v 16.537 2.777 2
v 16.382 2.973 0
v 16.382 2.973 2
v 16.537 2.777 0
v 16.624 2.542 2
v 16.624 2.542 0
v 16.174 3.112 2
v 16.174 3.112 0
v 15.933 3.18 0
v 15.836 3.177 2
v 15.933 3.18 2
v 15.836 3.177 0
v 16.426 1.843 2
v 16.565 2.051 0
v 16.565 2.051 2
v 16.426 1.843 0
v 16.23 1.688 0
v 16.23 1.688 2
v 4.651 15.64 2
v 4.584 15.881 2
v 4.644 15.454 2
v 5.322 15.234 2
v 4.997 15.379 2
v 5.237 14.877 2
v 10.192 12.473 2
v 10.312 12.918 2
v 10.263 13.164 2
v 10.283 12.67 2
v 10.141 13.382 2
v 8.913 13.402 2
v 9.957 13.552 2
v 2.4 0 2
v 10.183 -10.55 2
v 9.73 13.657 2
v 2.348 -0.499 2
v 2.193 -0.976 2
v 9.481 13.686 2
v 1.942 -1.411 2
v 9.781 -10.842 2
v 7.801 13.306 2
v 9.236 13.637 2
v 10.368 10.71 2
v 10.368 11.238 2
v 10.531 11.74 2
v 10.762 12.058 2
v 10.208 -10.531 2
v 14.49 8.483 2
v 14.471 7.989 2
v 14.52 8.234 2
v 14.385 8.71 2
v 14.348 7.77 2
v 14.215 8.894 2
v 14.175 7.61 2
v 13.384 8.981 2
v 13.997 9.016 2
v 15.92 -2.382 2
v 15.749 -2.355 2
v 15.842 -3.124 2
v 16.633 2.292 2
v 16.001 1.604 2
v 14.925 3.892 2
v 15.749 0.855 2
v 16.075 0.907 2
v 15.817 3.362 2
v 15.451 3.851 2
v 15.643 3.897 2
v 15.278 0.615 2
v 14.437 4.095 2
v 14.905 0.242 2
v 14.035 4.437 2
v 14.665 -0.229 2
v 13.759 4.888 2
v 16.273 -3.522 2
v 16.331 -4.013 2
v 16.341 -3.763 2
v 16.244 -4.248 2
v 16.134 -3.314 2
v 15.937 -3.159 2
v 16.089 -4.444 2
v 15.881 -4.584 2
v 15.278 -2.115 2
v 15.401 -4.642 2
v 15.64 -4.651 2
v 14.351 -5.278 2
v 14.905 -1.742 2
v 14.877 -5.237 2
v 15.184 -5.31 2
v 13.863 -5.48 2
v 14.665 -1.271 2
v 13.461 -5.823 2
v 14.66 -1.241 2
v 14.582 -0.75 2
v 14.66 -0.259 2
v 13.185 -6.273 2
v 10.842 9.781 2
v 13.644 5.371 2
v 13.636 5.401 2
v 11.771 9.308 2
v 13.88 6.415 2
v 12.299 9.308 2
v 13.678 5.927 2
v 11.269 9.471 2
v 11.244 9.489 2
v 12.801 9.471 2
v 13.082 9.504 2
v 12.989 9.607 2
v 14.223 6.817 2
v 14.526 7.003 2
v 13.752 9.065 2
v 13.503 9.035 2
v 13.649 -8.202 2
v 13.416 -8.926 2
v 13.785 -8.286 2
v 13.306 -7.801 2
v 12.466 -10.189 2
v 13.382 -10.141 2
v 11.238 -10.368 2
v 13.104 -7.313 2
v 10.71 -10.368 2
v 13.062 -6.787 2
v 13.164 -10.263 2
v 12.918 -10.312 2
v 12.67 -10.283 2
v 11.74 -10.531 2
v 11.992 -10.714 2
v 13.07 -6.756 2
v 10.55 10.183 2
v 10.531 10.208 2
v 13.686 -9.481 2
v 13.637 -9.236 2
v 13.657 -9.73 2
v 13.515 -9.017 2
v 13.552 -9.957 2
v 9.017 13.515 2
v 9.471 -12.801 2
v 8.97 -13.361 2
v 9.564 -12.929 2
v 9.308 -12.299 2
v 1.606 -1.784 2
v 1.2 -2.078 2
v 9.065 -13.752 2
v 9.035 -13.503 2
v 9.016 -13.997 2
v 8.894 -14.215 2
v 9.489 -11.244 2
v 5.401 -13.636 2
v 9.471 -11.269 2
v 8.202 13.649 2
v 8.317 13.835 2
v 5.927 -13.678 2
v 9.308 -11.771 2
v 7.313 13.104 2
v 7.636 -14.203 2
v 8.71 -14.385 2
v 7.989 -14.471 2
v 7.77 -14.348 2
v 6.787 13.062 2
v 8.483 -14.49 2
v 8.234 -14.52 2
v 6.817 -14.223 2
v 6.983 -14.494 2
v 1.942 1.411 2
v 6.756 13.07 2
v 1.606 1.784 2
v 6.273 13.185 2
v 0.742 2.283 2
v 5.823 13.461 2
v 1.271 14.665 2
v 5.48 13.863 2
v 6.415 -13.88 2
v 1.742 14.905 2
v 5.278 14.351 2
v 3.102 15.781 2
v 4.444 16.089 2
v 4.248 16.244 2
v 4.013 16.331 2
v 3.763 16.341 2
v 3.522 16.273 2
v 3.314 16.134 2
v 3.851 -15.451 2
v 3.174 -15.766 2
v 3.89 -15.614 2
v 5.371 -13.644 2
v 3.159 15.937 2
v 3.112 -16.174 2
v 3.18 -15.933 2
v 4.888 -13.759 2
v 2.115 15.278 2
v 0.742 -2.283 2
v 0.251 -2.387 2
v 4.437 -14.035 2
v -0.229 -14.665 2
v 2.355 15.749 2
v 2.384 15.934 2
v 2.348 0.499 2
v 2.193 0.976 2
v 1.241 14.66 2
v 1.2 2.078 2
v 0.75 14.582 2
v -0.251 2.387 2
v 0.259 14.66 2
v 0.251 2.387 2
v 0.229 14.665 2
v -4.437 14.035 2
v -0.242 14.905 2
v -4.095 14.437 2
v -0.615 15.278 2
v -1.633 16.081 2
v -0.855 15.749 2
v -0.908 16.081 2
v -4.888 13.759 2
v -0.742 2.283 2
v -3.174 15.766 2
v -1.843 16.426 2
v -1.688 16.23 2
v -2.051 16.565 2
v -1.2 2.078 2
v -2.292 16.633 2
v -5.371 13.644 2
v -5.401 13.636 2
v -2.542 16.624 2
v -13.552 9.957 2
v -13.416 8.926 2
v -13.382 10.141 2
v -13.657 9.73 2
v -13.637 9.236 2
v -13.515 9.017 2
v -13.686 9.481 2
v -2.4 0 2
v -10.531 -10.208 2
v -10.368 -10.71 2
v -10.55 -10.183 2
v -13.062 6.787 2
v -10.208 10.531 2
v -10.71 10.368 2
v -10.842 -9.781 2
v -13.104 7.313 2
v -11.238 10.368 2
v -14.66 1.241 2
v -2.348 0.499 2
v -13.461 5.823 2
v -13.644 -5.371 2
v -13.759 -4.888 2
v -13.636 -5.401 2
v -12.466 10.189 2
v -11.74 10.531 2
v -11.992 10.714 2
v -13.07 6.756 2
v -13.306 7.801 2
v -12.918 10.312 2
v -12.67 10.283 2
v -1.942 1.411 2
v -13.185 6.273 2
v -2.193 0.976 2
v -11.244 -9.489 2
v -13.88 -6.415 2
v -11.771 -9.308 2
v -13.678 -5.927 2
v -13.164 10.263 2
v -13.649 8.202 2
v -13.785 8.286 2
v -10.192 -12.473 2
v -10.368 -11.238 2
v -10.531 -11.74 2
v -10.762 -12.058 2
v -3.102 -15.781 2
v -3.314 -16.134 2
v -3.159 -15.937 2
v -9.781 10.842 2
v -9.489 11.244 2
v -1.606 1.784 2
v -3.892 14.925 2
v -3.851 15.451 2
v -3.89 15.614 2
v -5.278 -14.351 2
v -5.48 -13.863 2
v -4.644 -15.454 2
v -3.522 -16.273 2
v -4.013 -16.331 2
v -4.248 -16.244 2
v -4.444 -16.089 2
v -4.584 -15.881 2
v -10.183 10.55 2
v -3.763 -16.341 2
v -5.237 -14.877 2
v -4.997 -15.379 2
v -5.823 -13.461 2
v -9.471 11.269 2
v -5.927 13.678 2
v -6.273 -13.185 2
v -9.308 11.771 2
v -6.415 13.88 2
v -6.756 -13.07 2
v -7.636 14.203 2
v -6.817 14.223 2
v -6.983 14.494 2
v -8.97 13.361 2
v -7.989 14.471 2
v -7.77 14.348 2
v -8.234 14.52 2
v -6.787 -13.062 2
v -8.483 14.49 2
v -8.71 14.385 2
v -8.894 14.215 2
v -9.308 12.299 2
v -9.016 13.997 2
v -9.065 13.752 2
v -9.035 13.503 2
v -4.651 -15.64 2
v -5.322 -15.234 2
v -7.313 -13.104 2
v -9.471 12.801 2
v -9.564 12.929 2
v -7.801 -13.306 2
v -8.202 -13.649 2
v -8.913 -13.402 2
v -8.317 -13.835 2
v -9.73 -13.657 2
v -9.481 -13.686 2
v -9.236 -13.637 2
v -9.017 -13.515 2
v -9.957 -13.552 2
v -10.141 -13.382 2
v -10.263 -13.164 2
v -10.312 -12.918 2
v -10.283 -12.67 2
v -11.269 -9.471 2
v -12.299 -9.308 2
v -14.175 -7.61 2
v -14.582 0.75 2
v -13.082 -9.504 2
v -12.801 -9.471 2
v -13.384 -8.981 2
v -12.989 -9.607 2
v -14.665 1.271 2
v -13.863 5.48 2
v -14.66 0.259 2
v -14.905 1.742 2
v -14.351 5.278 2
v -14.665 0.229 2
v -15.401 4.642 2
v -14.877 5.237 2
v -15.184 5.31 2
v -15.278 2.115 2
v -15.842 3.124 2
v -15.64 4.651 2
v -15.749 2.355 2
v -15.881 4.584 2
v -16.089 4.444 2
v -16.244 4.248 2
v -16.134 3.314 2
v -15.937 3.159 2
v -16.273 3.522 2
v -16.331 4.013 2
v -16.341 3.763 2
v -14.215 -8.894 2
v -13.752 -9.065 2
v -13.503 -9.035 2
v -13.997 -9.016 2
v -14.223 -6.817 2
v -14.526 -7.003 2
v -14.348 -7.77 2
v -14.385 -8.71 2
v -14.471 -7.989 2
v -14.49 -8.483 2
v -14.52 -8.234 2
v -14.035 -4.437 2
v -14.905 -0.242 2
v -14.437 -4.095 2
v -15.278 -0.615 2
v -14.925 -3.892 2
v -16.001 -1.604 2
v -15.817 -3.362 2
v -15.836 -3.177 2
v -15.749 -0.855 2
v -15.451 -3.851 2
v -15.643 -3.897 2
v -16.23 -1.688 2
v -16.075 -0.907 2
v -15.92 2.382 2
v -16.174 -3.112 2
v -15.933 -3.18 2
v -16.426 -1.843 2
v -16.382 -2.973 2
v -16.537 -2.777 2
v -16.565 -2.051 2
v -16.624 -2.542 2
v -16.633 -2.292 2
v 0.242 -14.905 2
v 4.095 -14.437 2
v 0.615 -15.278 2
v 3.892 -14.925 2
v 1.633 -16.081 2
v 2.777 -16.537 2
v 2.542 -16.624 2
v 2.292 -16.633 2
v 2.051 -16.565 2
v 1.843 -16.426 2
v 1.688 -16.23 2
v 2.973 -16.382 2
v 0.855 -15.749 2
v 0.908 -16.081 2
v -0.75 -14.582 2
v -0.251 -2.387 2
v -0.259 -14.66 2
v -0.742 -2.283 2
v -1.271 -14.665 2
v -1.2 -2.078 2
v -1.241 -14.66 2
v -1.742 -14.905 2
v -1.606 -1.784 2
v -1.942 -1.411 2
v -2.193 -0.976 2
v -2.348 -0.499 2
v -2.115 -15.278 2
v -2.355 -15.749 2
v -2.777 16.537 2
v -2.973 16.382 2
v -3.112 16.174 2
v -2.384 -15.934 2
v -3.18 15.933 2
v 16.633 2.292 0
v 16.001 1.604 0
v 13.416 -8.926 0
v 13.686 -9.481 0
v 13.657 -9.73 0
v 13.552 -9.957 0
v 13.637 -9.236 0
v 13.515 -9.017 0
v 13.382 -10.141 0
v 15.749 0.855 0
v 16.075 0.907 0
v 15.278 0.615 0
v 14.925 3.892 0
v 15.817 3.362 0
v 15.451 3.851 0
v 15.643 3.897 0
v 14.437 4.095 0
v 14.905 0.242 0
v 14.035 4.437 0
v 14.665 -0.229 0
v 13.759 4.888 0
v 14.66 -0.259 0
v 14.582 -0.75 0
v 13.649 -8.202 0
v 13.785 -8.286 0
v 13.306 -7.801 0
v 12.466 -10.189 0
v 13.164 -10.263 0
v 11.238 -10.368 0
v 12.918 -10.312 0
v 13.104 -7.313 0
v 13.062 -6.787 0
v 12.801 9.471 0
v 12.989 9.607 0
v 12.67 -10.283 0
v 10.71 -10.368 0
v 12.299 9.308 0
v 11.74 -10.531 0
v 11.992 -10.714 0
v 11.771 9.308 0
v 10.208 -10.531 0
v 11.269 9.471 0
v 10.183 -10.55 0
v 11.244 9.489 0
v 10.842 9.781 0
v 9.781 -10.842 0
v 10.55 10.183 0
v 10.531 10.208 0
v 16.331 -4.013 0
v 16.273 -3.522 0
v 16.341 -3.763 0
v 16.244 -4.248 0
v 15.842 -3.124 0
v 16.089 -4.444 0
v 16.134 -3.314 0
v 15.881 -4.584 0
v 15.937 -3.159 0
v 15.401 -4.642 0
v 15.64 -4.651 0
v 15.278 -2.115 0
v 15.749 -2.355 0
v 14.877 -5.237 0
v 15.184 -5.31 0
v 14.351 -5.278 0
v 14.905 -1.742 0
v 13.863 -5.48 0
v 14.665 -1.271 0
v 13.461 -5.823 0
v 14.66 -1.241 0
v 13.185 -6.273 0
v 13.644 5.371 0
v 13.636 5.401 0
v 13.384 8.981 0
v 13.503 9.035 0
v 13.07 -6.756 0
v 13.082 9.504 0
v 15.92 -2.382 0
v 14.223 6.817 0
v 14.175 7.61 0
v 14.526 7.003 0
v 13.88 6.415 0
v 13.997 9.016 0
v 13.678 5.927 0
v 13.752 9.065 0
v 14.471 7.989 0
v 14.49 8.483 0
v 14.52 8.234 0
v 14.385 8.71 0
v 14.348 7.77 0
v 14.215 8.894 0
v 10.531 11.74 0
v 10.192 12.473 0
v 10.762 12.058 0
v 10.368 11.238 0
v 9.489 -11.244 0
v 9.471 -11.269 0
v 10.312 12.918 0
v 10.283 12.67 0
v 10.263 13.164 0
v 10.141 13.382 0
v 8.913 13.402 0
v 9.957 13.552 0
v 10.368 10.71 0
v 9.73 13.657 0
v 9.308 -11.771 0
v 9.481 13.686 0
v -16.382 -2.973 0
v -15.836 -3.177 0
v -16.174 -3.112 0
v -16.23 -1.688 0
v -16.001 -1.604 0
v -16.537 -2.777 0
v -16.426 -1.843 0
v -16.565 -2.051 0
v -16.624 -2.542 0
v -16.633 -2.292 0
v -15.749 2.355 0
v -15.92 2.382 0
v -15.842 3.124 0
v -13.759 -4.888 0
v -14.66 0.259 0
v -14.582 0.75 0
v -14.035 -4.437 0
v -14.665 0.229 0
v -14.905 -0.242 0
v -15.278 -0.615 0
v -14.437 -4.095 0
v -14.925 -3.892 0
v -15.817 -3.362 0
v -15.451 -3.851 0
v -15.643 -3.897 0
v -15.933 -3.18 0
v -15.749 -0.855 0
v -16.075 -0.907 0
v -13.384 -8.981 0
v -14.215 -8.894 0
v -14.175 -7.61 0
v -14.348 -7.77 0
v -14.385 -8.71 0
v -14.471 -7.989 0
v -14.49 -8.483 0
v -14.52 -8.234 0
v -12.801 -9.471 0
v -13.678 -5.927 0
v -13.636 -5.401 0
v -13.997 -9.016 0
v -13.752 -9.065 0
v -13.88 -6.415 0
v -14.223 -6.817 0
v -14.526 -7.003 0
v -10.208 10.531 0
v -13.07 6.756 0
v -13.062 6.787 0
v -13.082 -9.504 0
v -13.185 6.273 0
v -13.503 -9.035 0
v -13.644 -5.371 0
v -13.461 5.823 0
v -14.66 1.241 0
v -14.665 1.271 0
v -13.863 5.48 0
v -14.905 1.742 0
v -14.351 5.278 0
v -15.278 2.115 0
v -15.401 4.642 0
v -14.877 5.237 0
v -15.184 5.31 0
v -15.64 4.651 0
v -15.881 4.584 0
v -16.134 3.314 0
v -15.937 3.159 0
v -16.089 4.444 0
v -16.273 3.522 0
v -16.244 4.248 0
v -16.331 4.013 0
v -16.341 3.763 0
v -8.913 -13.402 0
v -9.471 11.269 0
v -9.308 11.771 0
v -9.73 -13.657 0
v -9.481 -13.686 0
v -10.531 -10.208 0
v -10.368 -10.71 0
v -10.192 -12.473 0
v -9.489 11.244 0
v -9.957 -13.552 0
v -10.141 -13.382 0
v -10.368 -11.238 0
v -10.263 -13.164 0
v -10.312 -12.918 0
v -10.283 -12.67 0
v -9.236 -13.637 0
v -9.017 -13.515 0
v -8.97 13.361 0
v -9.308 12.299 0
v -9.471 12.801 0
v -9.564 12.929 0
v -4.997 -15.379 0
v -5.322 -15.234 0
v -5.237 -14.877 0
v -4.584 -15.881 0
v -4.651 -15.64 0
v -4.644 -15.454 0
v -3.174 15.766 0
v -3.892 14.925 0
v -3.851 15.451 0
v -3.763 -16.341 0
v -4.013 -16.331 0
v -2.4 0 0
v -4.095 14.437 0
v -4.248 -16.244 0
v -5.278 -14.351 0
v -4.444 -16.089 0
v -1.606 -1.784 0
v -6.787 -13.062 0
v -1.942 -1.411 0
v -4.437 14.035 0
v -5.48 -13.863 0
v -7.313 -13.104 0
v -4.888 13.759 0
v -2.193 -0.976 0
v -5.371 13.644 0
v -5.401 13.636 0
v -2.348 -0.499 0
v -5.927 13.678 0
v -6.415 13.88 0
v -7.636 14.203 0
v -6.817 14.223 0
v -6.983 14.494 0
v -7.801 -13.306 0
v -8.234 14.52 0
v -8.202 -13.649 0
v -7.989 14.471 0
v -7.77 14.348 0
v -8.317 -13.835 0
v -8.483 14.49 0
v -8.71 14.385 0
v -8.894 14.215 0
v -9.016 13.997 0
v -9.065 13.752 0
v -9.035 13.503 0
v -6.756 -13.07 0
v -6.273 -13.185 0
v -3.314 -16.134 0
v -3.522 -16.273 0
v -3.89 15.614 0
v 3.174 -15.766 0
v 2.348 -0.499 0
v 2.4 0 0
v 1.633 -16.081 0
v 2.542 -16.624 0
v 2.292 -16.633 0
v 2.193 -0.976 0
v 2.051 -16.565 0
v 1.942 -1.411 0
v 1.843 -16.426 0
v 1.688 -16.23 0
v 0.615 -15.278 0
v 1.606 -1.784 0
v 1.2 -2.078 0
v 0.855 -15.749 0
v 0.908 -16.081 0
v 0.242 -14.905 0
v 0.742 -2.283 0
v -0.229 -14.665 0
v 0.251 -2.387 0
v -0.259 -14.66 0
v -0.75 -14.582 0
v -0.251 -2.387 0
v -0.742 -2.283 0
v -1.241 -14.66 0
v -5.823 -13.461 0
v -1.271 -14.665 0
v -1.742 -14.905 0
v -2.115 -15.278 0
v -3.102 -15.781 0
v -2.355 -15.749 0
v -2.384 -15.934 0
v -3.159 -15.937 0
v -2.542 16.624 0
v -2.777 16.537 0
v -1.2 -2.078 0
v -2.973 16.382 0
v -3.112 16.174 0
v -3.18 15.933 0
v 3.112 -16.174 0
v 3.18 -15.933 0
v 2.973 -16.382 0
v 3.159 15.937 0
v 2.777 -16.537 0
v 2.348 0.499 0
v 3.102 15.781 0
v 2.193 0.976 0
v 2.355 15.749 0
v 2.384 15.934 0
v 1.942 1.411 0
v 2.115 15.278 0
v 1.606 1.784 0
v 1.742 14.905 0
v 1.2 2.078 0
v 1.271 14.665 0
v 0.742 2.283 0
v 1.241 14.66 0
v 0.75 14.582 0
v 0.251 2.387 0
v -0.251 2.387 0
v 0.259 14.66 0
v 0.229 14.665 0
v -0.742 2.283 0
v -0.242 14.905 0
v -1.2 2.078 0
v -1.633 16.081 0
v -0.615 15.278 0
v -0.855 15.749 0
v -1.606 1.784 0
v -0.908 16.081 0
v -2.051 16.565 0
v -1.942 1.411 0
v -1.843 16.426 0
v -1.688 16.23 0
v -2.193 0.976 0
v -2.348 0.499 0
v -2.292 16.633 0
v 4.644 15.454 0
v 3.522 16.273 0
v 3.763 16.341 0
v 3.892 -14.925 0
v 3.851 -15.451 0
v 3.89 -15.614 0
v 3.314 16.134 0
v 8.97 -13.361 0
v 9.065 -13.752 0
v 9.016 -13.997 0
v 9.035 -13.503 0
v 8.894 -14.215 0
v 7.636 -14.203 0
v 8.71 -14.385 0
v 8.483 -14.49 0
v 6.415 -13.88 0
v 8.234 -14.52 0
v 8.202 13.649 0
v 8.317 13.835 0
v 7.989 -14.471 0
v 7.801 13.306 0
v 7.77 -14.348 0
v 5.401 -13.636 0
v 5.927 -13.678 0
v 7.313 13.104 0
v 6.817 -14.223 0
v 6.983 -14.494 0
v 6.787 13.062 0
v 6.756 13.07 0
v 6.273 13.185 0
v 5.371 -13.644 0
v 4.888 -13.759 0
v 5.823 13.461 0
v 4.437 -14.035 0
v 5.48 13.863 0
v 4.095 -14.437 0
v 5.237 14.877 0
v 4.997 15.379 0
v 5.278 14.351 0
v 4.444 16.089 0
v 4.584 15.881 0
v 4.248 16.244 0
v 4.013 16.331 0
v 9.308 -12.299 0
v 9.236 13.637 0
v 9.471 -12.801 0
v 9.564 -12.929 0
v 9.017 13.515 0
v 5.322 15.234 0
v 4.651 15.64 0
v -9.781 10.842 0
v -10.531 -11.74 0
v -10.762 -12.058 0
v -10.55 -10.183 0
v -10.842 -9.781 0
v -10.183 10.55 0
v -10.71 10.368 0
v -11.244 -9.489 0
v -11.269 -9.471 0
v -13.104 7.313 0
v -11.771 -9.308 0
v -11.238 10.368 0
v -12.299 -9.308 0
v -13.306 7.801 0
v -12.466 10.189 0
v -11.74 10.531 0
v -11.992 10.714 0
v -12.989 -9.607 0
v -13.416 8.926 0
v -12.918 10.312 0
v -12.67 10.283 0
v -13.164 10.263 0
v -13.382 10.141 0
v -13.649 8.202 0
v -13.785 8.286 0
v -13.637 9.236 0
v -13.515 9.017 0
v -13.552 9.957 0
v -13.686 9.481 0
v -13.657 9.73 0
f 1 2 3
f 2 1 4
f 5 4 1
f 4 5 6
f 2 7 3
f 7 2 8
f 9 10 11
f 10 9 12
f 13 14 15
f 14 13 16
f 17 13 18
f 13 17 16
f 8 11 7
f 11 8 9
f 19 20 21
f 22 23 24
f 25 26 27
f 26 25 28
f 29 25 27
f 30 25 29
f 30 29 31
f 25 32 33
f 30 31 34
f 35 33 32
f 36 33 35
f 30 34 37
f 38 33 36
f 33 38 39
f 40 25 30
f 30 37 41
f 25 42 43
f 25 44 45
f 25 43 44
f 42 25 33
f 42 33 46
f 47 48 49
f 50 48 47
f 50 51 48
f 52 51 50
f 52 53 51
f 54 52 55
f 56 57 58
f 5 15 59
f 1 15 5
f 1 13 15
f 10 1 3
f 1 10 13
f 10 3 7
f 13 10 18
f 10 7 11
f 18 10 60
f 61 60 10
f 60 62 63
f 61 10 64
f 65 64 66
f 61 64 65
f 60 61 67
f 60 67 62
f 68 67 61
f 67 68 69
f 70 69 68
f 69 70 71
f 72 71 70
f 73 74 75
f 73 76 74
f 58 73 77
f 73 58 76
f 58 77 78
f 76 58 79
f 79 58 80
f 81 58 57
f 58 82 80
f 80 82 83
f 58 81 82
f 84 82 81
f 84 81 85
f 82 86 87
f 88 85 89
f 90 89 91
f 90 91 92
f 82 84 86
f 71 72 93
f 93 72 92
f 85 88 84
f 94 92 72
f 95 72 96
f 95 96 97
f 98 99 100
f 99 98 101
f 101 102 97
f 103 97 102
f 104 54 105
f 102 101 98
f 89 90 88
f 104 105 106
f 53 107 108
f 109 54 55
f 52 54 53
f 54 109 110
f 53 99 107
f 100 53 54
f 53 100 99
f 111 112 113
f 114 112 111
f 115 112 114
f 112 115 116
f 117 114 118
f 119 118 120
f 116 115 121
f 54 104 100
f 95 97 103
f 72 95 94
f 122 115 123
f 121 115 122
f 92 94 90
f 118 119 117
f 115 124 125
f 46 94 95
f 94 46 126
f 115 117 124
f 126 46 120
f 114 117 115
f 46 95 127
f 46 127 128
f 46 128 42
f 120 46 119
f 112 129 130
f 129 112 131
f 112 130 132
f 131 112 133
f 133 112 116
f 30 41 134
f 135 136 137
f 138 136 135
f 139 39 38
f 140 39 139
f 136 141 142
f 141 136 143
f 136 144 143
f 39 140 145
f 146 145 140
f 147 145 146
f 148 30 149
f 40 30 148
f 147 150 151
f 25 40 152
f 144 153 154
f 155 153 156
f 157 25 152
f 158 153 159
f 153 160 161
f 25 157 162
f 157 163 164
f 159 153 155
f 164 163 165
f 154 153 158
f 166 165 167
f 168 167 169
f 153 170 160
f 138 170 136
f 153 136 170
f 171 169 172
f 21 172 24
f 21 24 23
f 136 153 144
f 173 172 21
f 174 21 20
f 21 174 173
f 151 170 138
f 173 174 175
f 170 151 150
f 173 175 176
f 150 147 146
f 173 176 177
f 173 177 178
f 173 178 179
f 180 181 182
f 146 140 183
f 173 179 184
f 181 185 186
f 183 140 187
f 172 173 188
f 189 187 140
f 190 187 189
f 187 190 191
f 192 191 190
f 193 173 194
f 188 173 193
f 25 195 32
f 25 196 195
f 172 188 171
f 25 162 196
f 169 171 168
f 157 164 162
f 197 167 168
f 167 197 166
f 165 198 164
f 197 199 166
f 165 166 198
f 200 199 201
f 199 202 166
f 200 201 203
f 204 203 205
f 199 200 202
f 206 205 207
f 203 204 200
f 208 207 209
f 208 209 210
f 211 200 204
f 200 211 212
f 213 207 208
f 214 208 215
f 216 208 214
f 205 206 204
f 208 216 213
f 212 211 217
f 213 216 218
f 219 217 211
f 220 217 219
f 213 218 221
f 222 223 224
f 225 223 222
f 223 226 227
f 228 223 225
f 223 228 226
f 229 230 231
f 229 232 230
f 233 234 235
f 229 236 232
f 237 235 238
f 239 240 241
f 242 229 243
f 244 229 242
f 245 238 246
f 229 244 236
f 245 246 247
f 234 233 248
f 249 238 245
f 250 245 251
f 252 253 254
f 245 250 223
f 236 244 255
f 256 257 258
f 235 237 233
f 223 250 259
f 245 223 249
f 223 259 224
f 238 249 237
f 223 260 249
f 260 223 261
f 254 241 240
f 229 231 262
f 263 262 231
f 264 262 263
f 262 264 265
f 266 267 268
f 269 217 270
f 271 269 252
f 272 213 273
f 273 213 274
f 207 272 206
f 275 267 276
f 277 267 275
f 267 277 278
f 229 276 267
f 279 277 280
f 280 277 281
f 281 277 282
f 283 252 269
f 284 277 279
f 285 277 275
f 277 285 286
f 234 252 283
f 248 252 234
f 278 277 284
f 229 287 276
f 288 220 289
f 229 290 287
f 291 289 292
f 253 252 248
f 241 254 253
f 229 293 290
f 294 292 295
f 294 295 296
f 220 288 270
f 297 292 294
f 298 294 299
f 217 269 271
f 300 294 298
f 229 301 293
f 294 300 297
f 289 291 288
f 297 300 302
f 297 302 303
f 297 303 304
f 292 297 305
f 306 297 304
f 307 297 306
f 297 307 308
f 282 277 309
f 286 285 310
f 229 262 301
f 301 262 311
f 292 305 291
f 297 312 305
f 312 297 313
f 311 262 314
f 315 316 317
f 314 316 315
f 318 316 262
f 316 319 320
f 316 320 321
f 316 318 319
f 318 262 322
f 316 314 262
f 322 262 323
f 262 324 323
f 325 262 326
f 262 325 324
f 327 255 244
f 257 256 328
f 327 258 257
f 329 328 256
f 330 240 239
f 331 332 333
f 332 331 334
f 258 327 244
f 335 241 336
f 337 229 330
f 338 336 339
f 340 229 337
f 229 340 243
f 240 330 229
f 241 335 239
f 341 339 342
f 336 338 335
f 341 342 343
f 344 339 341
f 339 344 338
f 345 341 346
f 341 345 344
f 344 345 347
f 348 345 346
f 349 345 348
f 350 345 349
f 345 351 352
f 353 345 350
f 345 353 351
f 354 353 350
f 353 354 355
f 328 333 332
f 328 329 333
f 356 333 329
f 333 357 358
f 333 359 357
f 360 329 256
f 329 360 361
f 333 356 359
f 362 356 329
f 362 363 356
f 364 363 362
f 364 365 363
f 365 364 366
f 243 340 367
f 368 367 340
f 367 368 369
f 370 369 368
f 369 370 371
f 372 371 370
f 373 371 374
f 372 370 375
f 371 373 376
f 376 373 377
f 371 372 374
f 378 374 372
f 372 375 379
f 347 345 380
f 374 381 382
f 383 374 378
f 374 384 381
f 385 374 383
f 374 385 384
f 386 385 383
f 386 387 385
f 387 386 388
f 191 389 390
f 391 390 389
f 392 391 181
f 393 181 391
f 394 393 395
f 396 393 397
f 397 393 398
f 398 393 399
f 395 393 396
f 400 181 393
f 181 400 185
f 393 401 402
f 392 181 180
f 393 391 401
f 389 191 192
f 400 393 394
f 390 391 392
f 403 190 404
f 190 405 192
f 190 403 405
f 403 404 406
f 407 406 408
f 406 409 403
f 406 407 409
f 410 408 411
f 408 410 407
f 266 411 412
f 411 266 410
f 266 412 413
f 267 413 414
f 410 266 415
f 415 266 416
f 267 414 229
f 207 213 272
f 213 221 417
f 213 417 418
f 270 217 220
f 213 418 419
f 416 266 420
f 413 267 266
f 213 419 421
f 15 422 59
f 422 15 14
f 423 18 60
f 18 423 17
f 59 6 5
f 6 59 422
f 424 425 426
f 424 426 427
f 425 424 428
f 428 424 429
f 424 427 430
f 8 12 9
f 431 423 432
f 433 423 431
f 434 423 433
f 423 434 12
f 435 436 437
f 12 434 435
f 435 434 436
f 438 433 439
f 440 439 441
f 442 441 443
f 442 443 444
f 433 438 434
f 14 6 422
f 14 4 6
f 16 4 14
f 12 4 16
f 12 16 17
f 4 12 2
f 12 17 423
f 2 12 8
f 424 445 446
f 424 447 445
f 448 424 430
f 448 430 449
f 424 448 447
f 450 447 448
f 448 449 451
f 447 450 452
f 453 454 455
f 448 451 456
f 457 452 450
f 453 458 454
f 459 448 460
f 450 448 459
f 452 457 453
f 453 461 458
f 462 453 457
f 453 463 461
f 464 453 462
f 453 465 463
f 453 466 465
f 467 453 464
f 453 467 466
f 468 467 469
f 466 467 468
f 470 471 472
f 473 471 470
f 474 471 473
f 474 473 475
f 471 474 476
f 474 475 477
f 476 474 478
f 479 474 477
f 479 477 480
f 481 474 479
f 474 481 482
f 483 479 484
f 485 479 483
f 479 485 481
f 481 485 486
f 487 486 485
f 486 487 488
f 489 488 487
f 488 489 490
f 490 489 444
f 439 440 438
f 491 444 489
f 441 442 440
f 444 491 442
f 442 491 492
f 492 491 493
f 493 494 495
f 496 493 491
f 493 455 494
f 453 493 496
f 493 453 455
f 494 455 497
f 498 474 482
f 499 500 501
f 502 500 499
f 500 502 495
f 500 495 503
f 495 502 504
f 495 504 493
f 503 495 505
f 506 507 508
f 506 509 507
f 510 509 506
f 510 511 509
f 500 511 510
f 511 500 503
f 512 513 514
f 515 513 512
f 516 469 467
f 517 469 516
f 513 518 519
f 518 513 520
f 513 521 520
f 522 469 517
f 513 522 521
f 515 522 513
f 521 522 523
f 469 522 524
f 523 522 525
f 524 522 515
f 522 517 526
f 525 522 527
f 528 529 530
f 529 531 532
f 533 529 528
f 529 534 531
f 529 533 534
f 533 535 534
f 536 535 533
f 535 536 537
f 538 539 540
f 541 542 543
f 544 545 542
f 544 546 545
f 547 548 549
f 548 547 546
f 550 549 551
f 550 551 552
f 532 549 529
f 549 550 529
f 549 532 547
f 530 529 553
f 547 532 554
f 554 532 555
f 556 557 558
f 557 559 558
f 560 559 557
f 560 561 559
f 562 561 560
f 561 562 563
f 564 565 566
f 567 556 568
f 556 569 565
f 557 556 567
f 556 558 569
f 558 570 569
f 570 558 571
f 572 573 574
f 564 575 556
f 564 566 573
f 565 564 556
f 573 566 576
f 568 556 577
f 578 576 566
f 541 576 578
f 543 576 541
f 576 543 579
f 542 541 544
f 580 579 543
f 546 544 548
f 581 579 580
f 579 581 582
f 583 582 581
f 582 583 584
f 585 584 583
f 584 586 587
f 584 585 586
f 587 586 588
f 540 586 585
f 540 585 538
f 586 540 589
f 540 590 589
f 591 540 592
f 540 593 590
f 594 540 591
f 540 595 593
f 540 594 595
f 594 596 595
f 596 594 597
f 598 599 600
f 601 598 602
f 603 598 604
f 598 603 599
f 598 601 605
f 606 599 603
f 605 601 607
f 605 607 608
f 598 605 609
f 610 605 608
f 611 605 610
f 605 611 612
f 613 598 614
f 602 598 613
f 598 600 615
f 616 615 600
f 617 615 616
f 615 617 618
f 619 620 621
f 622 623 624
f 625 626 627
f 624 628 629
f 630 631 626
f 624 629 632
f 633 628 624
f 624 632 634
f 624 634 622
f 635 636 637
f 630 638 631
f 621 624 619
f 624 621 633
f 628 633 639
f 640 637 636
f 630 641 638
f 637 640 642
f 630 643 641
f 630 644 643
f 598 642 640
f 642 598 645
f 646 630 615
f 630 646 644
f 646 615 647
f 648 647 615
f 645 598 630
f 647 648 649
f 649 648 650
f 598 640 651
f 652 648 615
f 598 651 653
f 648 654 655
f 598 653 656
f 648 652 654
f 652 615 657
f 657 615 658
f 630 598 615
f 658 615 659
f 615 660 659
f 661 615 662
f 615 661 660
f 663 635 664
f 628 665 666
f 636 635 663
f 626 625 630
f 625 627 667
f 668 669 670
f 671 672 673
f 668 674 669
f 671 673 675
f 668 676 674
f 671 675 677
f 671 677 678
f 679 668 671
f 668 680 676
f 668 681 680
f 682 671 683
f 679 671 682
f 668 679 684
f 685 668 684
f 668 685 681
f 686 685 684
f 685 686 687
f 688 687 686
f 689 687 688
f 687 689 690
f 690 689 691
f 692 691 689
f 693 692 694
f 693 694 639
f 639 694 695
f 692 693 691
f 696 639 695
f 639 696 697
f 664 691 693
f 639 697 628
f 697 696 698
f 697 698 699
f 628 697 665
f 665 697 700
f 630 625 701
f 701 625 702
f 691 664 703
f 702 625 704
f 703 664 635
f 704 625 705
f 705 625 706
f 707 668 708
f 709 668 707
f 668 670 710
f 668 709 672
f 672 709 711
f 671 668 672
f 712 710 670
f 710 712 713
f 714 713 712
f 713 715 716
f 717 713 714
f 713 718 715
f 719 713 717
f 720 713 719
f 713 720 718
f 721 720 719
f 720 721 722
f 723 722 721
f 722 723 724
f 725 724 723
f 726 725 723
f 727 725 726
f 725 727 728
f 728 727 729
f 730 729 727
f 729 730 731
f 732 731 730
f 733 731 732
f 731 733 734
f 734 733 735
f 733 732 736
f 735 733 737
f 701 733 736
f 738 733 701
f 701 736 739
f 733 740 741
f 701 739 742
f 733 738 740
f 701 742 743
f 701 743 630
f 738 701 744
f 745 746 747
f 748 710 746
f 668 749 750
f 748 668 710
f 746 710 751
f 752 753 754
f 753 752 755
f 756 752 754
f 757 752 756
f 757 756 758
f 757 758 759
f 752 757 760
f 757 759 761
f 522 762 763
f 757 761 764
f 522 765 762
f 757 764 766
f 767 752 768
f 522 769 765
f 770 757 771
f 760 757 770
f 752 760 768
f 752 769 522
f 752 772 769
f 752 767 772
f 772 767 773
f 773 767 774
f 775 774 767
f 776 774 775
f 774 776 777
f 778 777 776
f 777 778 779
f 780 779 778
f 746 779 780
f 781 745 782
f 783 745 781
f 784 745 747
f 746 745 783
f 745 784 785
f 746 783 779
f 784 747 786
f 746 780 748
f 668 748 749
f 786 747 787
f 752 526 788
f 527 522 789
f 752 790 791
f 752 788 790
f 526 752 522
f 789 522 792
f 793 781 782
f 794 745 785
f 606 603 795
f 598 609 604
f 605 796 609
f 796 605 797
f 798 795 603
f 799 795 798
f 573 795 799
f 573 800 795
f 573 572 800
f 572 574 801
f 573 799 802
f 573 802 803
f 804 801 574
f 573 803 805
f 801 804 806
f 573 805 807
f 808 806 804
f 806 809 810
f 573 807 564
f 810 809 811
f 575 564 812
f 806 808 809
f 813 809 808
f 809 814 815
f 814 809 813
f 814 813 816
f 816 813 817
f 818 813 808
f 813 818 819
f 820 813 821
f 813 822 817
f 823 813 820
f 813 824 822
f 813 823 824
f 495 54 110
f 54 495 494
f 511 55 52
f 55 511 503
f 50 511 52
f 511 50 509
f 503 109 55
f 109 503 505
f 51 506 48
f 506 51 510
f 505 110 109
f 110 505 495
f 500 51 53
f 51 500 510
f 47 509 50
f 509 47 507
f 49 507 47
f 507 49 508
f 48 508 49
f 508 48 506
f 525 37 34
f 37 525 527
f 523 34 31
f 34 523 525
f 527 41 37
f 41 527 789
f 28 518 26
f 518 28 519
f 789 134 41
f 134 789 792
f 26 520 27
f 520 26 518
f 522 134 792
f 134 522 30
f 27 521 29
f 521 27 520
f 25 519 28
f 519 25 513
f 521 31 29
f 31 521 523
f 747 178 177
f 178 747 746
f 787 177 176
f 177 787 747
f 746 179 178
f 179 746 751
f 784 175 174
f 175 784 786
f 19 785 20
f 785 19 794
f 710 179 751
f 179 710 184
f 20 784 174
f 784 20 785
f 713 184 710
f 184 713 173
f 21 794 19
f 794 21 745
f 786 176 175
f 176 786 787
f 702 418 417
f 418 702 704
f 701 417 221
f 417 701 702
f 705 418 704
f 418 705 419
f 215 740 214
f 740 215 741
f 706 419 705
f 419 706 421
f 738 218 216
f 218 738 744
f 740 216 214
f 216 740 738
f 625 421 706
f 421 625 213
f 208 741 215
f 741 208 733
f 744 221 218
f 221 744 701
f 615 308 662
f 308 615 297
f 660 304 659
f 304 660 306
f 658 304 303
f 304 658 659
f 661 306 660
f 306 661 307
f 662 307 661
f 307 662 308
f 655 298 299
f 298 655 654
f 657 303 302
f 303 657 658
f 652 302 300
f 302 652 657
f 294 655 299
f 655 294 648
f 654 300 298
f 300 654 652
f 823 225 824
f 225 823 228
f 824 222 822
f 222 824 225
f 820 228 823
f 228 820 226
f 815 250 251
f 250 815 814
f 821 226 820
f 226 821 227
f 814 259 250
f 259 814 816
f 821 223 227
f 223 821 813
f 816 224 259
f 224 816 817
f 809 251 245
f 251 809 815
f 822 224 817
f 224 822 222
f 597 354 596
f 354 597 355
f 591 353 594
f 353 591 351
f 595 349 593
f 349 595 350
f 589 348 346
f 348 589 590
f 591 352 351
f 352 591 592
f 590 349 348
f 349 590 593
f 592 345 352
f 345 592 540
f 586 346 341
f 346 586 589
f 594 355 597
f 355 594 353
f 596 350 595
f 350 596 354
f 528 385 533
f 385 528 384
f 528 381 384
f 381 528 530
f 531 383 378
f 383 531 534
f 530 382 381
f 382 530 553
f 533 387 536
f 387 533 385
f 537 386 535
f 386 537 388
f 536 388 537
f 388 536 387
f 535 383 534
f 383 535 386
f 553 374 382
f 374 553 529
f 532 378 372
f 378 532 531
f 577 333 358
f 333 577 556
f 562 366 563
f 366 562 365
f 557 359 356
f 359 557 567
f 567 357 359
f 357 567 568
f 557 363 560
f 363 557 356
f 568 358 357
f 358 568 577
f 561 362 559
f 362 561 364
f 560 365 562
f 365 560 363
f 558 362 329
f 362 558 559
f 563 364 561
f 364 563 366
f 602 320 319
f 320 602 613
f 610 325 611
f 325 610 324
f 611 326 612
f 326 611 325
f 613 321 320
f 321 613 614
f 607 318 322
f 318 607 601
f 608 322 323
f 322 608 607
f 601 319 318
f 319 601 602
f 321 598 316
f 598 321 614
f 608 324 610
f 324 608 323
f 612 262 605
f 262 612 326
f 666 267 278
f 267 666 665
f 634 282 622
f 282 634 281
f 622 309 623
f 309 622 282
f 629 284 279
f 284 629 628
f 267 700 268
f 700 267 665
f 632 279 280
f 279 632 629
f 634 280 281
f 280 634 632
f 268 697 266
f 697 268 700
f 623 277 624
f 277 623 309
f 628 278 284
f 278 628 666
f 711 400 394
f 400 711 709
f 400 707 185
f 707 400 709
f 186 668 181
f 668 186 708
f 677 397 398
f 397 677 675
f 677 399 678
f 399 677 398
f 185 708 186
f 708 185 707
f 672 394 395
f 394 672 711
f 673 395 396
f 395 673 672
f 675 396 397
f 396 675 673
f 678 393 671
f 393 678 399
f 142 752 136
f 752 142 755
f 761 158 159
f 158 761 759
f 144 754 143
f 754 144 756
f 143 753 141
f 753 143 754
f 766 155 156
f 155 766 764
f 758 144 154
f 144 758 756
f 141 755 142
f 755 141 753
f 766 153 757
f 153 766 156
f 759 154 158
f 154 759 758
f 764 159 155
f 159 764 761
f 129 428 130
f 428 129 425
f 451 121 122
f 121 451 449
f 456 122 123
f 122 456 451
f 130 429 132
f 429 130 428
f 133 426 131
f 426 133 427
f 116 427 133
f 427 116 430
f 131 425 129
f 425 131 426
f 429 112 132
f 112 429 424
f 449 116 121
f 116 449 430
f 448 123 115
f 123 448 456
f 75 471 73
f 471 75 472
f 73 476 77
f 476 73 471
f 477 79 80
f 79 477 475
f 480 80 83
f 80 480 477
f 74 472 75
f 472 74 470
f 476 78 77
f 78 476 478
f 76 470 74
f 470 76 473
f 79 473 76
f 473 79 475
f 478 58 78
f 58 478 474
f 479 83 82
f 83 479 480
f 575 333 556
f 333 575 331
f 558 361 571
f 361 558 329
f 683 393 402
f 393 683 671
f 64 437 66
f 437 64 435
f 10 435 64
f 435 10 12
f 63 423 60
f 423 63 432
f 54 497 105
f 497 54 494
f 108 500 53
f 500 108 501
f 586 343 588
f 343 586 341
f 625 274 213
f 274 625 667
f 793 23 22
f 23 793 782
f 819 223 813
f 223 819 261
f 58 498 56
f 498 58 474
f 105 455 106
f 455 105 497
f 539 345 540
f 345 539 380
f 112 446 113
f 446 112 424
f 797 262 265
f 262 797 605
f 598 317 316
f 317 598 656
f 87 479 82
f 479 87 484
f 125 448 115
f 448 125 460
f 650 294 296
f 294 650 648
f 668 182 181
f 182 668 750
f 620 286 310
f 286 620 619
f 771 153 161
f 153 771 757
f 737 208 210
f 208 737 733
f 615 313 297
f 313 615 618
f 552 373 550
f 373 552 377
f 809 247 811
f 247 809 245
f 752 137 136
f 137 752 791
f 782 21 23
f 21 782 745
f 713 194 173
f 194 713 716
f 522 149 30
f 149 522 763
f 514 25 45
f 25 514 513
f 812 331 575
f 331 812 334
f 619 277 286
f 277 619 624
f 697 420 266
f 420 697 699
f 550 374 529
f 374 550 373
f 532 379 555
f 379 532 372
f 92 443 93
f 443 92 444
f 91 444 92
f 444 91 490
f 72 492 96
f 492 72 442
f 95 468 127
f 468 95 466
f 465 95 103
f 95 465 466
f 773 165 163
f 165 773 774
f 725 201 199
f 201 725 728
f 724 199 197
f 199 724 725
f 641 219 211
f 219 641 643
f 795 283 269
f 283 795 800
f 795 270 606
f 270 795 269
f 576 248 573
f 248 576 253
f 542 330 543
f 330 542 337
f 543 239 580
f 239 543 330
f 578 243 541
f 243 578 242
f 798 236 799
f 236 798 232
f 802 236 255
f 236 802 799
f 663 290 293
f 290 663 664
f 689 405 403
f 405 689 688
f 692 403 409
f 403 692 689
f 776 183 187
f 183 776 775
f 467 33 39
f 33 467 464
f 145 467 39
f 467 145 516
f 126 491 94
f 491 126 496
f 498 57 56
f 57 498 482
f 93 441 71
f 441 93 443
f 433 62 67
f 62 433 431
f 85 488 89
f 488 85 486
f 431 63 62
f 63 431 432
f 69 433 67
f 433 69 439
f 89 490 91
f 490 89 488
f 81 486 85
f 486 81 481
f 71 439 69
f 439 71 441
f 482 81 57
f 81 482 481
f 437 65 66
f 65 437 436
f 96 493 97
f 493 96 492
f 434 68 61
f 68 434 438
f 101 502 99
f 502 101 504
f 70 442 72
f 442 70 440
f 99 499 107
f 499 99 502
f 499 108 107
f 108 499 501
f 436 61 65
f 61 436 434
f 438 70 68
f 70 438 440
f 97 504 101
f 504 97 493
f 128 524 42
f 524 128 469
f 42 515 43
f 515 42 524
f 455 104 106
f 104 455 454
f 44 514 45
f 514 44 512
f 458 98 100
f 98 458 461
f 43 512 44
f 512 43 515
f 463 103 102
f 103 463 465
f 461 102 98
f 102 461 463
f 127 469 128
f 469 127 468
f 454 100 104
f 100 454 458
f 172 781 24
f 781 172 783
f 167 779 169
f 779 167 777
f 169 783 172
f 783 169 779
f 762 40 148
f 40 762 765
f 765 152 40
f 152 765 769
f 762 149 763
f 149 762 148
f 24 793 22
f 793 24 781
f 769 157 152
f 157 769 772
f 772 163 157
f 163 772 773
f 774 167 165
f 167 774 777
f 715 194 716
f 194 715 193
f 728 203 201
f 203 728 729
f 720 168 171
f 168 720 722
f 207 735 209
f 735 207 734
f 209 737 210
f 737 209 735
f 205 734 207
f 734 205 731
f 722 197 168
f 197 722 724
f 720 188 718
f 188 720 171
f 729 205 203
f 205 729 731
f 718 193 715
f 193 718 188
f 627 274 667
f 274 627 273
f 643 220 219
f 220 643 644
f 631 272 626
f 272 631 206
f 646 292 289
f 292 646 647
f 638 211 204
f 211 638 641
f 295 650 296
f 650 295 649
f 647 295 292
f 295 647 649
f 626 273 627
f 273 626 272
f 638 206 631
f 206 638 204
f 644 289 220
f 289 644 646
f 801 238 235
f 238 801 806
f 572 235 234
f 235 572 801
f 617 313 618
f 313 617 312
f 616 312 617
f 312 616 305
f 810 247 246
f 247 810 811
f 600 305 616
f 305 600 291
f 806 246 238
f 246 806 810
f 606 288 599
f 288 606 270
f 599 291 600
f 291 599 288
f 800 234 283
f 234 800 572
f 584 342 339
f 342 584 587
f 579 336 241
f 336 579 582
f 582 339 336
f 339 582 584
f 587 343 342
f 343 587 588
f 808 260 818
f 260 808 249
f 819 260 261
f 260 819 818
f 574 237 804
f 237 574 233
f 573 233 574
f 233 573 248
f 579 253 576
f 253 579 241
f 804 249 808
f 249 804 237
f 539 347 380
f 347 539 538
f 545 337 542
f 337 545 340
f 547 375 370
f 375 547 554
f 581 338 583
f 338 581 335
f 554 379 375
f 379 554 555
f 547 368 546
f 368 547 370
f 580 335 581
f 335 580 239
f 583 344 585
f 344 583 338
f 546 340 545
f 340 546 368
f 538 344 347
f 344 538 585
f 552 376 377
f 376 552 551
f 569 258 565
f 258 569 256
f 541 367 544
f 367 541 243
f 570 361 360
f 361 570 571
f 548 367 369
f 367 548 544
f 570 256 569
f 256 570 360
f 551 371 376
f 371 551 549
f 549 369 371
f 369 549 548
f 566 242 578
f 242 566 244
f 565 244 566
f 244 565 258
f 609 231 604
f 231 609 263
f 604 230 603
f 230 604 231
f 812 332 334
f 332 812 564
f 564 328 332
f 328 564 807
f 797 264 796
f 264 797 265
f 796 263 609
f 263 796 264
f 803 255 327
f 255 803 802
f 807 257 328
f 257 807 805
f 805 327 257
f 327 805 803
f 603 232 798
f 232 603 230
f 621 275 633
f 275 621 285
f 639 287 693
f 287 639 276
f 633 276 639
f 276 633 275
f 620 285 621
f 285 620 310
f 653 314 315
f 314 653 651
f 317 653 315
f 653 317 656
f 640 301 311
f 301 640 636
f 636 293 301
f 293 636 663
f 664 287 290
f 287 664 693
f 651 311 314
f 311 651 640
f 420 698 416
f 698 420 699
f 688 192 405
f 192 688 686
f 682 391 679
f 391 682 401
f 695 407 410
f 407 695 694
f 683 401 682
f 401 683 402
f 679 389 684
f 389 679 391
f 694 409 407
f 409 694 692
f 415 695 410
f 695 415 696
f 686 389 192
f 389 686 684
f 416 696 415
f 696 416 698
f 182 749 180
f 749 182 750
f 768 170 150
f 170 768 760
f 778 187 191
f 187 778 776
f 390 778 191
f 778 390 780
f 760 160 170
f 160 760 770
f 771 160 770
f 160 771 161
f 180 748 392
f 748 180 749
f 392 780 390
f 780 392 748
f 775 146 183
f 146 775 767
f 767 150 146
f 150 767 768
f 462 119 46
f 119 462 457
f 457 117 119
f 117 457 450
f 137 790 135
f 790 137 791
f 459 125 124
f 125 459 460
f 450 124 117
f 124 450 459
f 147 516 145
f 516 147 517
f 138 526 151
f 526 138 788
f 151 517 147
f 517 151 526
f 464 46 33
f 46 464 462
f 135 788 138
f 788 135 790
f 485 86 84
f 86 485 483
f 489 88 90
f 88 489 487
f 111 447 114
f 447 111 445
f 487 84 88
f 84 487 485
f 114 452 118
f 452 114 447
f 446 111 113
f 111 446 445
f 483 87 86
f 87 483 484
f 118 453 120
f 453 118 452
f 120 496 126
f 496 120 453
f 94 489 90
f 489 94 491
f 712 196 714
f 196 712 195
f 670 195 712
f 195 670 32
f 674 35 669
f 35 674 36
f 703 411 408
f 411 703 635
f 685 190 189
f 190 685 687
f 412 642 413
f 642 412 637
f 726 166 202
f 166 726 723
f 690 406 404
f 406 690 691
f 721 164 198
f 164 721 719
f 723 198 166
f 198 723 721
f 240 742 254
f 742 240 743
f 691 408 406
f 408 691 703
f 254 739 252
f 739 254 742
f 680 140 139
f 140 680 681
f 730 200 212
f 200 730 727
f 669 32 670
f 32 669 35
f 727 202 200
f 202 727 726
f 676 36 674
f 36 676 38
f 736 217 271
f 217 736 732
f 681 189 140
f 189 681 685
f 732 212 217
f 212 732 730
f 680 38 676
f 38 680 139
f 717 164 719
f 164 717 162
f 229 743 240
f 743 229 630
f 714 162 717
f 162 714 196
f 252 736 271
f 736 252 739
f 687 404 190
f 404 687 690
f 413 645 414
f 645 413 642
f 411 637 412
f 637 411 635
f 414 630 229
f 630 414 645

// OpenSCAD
        difference(){
            union(){


                for (hoek =[360/(16*2):360/16:360])
                rotate([0,0,hoek]){
                    translate([32/2,-0.75,0]){
                        rotate([0,0,0]){
                            cylinder(h=2, r=0.8, $fn=20, center=false);
                        }
                    }

                    translate([34/2,-0.75,0]){
                        rotate([0,0,0]){
                      //      cylinder(h=2, r=0.7, $fn=10, center=false);
                        }
                    }
                }


                translate([0,0,0]){
                    rotate([0,0,0]){
                        cylinder(h=2, r=32.34/2, $fn=30, center=false);
                    }
                }  
                translate([0,0,0]){
                    rotate([0,0,0]){
                    //    cylinder(h=1, r=35/2, $fn=10, center=false);
                    }
                }  

                // houder
                translate([0,0,0]){
                    rotate([0,0,0]){
                  //      cylinder(h=10, r=9, $fn=10, center=false);
                    }
                }  


            }
            union() {

                for (hoek =[0:360/16:360])
                rotate([0,0,hoek]){
                    translate([32.34/2,-0.75,-1]){
                        rotate([0,0,0]){
                            cylinder(h=4, r=1.5875, $fn=20, center=false);
                        }
                    }
                }
                // extra grote hook
                for (hoek =[0:360/16:360])
                rotate([0,0,hoek]){
                    translate([32.34/2+0.1,-0.75,-1]){
                        rotate([0,0,0]){
                           cylinder(h=4, r=1.5875+0.1, $fn=20, center=false);
                        }
                    }
                }


                translate([0,0,-1]){
                    rotate([0,0,0]){
                        cylinder(h=20, r=2.4, $fn=30, center=false);
                    }
                }  

                translate([-10,0,6]){
                    rotate([0,90,0]){
                        cylinder(h=90, r=1.7, $fn=30, center=false);
                    }
                }  



            }
        }
